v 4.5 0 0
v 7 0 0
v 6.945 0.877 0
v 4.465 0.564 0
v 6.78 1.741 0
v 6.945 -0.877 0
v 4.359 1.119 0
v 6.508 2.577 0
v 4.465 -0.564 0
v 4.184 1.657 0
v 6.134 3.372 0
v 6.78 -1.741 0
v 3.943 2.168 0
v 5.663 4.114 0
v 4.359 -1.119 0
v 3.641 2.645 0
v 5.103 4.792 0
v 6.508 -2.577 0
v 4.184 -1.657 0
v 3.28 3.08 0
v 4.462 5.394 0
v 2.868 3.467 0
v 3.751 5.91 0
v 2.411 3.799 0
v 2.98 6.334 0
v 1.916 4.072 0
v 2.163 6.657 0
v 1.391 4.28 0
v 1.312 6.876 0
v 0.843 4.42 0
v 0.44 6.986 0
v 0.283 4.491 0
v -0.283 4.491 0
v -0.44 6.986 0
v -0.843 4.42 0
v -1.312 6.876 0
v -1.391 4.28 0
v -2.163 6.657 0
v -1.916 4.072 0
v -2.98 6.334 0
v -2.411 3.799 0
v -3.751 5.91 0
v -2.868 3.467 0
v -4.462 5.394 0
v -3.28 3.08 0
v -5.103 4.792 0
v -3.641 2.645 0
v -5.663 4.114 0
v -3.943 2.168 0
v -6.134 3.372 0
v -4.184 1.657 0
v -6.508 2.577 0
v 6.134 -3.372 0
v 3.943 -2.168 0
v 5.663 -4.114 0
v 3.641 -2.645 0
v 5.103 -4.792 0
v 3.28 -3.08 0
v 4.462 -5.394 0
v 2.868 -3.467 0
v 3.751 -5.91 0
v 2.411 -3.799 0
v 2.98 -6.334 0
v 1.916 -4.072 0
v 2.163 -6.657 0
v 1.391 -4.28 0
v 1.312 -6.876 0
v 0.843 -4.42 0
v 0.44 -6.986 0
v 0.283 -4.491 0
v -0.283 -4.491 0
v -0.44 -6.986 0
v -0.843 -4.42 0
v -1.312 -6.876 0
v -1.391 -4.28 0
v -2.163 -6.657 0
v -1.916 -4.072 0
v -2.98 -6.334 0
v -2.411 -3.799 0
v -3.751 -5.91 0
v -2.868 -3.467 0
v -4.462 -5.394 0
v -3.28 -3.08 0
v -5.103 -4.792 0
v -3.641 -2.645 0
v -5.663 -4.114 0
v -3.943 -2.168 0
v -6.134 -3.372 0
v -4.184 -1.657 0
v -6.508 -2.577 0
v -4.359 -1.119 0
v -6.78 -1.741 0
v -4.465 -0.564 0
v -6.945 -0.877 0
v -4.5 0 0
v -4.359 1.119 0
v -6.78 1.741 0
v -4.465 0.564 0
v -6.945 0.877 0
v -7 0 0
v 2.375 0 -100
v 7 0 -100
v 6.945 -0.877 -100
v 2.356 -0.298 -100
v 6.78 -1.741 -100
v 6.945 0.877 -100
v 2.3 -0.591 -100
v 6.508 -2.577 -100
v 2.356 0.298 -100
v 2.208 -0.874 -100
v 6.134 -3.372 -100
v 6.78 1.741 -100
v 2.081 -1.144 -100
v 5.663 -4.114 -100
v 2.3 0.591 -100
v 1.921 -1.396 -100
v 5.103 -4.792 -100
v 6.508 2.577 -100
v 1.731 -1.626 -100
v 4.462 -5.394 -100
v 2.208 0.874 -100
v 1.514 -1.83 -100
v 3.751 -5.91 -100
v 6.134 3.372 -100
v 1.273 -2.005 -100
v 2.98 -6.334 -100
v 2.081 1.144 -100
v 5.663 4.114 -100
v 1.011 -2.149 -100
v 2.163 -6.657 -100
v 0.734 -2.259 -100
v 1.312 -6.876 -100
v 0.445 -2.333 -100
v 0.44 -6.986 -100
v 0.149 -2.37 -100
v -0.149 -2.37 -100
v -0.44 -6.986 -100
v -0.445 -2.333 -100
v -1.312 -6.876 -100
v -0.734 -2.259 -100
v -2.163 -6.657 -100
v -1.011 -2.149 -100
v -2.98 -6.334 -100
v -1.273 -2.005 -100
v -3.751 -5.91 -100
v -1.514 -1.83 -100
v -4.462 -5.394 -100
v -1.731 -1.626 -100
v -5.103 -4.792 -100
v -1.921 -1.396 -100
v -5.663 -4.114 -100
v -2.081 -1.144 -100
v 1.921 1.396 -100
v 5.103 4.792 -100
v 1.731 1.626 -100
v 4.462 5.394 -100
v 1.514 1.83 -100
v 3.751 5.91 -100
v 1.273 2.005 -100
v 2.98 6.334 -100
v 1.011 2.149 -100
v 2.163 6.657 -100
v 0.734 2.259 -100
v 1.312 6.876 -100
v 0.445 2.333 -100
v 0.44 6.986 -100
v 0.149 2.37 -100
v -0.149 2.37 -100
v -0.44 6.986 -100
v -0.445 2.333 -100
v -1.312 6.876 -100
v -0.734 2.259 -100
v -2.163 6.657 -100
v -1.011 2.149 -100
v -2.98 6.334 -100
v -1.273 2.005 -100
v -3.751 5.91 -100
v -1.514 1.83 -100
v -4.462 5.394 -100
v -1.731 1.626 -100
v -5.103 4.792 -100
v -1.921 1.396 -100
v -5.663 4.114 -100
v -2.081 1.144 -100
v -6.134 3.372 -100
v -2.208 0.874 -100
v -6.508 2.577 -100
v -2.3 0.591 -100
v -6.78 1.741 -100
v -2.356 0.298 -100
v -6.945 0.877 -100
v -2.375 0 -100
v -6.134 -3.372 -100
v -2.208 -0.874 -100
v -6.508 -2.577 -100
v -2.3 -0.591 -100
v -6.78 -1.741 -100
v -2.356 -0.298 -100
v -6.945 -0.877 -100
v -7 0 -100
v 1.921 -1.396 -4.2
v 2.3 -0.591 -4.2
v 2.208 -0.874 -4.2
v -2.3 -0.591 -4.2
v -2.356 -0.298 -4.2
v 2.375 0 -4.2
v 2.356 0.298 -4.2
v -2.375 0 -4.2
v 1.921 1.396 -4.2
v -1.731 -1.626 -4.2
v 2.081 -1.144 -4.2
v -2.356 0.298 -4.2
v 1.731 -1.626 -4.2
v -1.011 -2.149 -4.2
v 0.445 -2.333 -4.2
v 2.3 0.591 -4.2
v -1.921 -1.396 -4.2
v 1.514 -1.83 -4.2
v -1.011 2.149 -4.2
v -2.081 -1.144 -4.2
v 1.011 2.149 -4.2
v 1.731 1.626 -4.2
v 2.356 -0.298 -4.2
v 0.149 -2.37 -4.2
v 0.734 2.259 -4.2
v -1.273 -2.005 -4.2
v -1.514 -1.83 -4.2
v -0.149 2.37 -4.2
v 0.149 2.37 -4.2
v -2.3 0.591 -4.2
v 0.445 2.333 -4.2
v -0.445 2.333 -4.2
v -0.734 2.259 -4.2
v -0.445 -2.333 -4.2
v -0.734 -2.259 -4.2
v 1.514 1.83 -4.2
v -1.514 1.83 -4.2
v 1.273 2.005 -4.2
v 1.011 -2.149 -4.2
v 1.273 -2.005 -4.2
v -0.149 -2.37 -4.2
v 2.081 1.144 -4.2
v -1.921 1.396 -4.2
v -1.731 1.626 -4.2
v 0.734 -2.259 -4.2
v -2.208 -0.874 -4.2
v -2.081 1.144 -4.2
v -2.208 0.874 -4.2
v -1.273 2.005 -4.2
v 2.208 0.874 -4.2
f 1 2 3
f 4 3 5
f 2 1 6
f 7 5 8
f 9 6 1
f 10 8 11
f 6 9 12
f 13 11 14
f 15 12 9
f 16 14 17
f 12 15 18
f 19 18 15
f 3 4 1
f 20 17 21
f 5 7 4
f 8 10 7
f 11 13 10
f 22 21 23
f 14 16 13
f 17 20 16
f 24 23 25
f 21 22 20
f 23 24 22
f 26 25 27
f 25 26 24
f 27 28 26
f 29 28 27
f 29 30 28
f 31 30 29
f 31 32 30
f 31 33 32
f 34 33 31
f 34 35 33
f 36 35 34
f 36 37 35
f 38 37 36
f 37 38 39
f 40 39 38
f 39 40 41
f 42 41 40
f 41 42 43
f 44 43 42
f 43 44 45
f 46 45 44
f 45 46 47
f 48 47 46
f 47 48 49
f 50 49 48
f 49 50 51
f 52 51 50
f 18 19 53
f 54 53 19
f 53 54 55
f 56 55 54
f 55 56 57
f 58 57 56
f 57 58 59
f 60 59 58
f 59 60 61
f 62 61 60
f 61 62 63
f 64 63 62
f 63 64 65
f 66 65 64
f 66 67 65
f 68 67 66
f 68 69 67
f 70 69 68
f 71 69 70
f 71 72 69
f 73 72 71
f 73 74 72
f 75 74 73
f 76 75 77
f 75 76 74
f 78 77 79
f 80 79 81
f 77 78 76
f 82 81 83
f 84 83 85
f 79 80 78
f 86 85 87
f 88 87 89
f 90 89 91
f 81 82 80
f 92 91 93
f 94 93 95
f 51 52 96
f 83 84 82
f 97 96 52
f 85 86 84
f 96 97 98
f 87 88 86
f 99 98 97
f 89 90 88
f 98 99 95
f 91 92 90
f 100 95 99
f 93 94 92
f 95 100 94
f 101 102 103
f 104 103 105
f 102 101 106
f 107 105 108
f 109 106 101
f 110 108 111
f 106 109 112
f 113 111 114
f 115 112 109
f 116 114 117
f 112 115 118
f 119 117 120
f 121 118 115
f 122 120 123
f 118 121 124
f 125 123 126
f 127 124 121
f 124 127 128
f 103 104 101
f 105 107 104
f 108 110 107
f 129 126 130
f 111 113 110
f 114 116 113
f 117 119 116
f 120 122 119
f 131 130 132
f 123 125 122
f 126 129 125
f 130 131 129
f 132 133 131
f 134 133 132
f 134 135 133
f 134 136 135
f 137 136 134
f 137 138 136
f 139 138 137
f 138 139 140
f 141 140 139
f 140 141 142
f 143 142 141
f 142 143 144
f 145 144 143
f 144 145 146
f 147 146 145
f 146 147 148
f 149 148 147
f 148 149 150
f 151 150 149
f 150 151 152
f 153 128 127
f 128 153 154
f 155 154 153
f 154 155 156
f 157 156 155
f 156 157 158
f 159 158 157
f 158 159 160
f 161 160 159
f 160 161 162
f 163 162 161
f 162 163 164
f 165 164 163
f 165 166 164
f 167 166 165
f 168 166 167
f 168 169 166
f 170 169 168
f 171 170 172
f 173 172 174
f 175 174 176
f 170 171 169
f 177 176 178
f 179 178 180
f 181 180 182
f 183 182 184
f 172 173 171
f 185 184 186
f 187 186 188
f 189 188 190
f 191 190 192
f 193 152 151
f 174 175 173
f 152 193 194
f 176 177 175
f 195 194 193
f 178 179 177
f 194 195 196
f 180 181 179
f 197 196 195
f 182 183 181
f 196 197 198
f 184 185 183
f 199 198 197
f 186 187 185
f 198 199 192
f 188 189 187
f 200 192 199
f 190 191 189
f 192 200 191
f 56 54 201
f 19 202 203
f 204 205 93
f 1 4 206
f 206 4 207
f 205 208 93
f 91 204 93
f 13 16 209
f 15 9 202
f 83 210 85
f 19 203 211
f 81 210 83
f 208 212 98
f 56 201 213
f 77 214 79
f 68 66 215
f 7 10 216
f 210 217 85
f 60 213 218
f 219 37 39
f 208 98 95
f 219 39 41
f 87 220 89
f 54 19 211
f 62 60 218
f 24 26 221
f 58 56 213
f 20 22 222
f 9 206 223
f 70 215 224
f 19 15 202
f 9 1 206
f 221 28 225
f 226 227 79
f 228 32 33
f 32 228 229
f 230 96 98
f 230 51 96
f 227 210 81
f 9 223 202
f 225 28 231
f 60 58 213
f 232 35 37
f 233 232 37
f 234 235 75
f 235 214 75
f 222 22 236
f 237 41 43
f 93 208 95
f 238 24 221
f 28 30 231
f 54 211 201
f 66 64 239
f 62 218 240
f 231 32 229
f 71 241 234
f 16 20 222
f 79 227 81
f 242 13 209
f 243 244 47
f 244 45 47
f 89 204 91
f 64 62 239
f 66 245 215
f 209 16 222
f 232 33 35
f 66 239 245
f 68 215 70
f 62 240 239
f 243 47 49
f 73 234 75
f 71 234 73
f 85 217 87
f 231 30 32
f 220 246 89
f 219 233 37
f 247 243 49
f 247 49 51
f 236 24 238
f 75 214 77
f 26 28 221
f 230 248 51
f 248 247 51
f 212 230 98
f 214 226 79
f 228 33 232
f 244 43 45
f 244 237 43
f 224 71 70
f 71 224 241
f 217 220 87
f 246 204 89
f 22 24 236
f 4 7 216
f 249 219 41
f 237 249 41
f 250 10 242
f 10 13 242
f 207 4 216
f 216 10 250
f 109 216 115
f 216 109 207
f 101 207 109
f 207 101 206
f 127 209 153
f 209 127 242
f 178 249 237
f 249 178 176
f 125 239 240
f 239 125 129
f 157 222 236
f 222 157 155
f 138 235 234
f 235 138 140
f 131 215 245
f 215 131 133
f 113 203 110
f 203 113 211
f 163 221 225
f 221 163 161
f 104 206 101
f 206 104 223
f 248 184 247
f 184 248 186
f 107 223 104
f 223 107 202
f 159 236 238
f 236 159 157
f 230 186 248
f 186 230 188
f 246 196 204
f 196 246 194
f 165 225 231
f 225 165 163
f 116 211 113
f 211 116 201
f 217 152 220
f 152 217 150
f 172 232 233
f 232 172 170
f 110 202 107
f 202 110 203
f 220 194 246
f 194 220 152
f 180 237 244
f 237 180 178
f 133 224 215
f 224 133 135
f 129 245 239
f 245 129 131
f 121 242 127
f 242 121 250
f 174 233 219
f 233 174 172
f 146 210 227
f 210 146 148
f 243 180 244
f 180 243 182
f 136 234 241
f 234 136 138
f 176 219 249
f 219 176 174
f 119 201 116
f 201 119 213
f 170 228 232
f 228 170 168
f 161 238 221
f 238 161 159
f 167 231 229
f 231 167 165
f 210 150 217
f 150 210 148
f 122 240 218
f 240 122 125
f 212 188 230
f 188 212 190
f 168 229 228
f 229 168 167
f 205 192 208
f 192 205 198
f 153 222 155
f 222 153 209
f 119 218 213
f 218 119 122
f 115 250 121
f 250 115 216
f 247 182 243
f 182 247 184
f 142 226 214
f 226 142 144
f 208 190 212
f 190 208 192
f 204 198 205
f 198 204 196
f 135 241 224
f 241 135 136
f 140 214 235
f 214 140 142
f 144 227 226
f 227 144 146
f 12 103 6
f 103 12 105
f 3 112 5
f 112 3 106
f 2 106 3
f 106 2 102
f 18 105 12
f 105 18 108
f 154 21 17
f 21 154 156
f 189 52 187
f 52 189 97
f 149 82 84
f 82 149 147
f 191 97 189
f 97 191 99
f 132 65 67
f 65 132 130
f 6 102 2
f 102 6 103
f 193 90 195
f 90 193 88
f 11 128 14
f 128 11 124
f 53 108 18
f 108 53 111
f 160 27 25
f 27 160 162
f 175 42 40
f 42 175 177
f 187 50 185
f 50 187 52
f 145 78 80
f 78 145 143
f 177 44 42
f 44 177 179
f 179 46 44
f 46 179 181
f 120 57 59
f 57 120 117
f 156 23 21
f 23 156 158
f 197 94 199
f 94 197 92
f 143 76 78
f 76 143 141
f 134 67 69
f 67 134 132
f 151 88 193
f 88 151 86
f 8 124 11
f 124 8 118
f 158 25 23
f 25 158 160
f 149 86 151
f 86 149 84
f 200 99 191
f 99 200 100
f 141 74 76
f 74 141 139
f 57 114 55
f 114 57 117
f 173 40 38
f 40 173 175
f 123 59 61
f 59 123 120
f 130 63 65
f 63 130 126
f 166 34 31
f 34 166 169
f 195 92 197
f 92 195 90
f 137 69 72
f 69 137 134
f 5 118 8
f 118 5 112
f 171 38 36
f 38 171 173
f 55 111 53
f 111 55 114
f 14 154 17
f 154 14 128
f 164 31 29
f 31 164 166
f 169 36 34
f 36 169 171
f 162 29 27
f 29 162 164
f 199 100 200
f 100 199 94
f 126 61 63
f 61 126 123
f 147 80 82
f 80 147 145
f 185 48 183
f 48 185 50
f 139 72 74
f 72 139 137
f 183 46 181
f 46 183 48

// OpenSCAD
$fn = 50;


difference() {
	union() {
		translate(v = [0, 0, -100.0000000000]) {
			cylinder(h = 100, r = 7.0000000000);
		}
		cylinder(h = 0, r = 10.0000000000);
	}
	union() {
		translate(v = [0, 0, 0]) {
			rotate(a = [0, 0, 0]) {
				difference() {
					union() {
						#translate(v = [0, 0, -100.0000000000]) {
							cylinder(h = 100, r = 2.2500000000);
						}
						#translate(v = [0, 0, -4.2000000000]) {
							cylinder(h = 4.2000000000, r = 7.0000000000, r1 = 2.3750000000, r2 = 4.5000000000);
						}
						#translate(v = [0, 0, -100.0000000000]) {
							cylinder(h = 100, r = 2.3750000000);
						}
						#translate(v = [0, 0, -100.0000000000]) {
							cylinder(h = 100, r = 2.2500000000);
						}
					}
					union();
				}
			}
		}
	}
}
